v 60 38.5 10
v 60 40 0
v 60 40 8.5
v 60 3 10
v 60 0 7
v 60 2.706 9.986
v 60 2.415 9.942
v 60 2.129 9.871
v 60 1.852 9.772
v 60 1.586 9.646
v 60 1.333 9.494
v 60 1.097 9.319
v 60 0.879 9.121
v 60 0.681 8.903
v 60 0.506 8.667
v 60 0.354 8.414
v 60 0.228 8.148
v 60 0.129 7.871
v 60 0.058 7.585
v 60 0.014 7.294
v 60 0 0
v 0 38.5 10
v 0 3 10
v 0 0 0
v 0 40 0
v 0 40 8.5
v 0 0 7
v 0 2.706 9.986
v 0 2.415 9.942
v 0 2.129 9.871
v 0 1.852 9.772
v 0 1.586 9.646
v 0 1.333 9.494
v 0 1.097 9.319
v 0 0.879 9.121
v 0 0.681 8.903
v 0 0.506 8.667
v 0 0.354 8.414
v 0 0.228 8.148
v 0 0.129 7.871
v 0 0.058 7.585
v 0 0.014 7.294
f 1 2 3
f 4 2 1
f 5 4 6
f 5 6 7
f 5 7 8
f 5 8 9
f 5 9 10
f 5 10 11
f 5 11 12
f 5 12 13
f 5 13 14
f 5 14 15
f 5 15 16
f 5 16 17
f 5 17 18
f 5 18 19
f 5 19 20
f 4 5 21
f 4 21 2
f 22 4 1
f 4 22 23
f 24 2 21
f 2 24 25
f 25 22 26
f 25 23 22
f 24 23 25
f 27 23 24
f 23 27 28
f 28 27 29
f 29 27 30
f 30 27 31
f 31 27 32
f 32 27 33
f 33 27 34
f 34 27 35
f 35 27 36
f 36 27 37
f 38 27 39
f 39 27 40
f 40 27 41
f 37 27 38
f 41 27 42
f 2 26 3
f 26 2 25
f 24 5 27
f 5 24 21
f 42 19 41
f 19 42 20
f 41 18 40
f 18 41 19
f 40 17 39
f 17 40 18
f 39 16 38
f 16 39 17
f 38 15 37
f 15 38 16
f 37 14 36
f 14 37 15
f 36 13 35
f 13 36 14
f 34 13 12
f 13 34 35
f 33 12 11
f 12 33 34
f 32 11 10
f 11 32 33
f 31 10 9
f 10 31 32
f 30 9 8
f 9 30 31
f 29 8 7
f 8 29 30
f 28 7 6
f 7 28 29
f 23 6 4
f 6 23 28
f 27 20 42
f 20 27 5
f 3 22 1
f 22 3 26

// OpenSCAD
// R3 is a spatial convex round along X, not an XY profile corner.
$fn = 64;
body_length = 60;
body_width = 40;
body_height = 10;
edge_round_1_radius = 3;
chamfer_1_width = 1.5;

module edge_round_block(body_length=60, body_width=40, body_height=10,
                        edge_round_1_radius=3, chamfer_1_width=1.5) {
    r = edge_round_1_radius;
    w = chamfer_1_width;
    assert(min(body_length,body_width,body_height,r,w)>0);
    assert(max(r,w)<body_height && r+w<body_width);
    module along_x() {
        multmatrix([[0,0,1,-1],[1,0,0,0],[0,1,0,0],[0,0,0,1]])
            linear_extrude(height=body_length+2) children();
    }
    difference() {
        cube([body_length,body_width,body_height]);
        along_x() difference() {
            translate([0,body_height-r]) square([r,r]);
            translate([r,body_height-r]) circle(r=r);
        }
        along_x() polygon([[body_width,body_height],
            [body_width-w,body_height],[body_width,body_height-w]]);
    }
}

edge_round_block(body_length,body_width,body_height,edge_round_1_radius,chamfer_1_width);
